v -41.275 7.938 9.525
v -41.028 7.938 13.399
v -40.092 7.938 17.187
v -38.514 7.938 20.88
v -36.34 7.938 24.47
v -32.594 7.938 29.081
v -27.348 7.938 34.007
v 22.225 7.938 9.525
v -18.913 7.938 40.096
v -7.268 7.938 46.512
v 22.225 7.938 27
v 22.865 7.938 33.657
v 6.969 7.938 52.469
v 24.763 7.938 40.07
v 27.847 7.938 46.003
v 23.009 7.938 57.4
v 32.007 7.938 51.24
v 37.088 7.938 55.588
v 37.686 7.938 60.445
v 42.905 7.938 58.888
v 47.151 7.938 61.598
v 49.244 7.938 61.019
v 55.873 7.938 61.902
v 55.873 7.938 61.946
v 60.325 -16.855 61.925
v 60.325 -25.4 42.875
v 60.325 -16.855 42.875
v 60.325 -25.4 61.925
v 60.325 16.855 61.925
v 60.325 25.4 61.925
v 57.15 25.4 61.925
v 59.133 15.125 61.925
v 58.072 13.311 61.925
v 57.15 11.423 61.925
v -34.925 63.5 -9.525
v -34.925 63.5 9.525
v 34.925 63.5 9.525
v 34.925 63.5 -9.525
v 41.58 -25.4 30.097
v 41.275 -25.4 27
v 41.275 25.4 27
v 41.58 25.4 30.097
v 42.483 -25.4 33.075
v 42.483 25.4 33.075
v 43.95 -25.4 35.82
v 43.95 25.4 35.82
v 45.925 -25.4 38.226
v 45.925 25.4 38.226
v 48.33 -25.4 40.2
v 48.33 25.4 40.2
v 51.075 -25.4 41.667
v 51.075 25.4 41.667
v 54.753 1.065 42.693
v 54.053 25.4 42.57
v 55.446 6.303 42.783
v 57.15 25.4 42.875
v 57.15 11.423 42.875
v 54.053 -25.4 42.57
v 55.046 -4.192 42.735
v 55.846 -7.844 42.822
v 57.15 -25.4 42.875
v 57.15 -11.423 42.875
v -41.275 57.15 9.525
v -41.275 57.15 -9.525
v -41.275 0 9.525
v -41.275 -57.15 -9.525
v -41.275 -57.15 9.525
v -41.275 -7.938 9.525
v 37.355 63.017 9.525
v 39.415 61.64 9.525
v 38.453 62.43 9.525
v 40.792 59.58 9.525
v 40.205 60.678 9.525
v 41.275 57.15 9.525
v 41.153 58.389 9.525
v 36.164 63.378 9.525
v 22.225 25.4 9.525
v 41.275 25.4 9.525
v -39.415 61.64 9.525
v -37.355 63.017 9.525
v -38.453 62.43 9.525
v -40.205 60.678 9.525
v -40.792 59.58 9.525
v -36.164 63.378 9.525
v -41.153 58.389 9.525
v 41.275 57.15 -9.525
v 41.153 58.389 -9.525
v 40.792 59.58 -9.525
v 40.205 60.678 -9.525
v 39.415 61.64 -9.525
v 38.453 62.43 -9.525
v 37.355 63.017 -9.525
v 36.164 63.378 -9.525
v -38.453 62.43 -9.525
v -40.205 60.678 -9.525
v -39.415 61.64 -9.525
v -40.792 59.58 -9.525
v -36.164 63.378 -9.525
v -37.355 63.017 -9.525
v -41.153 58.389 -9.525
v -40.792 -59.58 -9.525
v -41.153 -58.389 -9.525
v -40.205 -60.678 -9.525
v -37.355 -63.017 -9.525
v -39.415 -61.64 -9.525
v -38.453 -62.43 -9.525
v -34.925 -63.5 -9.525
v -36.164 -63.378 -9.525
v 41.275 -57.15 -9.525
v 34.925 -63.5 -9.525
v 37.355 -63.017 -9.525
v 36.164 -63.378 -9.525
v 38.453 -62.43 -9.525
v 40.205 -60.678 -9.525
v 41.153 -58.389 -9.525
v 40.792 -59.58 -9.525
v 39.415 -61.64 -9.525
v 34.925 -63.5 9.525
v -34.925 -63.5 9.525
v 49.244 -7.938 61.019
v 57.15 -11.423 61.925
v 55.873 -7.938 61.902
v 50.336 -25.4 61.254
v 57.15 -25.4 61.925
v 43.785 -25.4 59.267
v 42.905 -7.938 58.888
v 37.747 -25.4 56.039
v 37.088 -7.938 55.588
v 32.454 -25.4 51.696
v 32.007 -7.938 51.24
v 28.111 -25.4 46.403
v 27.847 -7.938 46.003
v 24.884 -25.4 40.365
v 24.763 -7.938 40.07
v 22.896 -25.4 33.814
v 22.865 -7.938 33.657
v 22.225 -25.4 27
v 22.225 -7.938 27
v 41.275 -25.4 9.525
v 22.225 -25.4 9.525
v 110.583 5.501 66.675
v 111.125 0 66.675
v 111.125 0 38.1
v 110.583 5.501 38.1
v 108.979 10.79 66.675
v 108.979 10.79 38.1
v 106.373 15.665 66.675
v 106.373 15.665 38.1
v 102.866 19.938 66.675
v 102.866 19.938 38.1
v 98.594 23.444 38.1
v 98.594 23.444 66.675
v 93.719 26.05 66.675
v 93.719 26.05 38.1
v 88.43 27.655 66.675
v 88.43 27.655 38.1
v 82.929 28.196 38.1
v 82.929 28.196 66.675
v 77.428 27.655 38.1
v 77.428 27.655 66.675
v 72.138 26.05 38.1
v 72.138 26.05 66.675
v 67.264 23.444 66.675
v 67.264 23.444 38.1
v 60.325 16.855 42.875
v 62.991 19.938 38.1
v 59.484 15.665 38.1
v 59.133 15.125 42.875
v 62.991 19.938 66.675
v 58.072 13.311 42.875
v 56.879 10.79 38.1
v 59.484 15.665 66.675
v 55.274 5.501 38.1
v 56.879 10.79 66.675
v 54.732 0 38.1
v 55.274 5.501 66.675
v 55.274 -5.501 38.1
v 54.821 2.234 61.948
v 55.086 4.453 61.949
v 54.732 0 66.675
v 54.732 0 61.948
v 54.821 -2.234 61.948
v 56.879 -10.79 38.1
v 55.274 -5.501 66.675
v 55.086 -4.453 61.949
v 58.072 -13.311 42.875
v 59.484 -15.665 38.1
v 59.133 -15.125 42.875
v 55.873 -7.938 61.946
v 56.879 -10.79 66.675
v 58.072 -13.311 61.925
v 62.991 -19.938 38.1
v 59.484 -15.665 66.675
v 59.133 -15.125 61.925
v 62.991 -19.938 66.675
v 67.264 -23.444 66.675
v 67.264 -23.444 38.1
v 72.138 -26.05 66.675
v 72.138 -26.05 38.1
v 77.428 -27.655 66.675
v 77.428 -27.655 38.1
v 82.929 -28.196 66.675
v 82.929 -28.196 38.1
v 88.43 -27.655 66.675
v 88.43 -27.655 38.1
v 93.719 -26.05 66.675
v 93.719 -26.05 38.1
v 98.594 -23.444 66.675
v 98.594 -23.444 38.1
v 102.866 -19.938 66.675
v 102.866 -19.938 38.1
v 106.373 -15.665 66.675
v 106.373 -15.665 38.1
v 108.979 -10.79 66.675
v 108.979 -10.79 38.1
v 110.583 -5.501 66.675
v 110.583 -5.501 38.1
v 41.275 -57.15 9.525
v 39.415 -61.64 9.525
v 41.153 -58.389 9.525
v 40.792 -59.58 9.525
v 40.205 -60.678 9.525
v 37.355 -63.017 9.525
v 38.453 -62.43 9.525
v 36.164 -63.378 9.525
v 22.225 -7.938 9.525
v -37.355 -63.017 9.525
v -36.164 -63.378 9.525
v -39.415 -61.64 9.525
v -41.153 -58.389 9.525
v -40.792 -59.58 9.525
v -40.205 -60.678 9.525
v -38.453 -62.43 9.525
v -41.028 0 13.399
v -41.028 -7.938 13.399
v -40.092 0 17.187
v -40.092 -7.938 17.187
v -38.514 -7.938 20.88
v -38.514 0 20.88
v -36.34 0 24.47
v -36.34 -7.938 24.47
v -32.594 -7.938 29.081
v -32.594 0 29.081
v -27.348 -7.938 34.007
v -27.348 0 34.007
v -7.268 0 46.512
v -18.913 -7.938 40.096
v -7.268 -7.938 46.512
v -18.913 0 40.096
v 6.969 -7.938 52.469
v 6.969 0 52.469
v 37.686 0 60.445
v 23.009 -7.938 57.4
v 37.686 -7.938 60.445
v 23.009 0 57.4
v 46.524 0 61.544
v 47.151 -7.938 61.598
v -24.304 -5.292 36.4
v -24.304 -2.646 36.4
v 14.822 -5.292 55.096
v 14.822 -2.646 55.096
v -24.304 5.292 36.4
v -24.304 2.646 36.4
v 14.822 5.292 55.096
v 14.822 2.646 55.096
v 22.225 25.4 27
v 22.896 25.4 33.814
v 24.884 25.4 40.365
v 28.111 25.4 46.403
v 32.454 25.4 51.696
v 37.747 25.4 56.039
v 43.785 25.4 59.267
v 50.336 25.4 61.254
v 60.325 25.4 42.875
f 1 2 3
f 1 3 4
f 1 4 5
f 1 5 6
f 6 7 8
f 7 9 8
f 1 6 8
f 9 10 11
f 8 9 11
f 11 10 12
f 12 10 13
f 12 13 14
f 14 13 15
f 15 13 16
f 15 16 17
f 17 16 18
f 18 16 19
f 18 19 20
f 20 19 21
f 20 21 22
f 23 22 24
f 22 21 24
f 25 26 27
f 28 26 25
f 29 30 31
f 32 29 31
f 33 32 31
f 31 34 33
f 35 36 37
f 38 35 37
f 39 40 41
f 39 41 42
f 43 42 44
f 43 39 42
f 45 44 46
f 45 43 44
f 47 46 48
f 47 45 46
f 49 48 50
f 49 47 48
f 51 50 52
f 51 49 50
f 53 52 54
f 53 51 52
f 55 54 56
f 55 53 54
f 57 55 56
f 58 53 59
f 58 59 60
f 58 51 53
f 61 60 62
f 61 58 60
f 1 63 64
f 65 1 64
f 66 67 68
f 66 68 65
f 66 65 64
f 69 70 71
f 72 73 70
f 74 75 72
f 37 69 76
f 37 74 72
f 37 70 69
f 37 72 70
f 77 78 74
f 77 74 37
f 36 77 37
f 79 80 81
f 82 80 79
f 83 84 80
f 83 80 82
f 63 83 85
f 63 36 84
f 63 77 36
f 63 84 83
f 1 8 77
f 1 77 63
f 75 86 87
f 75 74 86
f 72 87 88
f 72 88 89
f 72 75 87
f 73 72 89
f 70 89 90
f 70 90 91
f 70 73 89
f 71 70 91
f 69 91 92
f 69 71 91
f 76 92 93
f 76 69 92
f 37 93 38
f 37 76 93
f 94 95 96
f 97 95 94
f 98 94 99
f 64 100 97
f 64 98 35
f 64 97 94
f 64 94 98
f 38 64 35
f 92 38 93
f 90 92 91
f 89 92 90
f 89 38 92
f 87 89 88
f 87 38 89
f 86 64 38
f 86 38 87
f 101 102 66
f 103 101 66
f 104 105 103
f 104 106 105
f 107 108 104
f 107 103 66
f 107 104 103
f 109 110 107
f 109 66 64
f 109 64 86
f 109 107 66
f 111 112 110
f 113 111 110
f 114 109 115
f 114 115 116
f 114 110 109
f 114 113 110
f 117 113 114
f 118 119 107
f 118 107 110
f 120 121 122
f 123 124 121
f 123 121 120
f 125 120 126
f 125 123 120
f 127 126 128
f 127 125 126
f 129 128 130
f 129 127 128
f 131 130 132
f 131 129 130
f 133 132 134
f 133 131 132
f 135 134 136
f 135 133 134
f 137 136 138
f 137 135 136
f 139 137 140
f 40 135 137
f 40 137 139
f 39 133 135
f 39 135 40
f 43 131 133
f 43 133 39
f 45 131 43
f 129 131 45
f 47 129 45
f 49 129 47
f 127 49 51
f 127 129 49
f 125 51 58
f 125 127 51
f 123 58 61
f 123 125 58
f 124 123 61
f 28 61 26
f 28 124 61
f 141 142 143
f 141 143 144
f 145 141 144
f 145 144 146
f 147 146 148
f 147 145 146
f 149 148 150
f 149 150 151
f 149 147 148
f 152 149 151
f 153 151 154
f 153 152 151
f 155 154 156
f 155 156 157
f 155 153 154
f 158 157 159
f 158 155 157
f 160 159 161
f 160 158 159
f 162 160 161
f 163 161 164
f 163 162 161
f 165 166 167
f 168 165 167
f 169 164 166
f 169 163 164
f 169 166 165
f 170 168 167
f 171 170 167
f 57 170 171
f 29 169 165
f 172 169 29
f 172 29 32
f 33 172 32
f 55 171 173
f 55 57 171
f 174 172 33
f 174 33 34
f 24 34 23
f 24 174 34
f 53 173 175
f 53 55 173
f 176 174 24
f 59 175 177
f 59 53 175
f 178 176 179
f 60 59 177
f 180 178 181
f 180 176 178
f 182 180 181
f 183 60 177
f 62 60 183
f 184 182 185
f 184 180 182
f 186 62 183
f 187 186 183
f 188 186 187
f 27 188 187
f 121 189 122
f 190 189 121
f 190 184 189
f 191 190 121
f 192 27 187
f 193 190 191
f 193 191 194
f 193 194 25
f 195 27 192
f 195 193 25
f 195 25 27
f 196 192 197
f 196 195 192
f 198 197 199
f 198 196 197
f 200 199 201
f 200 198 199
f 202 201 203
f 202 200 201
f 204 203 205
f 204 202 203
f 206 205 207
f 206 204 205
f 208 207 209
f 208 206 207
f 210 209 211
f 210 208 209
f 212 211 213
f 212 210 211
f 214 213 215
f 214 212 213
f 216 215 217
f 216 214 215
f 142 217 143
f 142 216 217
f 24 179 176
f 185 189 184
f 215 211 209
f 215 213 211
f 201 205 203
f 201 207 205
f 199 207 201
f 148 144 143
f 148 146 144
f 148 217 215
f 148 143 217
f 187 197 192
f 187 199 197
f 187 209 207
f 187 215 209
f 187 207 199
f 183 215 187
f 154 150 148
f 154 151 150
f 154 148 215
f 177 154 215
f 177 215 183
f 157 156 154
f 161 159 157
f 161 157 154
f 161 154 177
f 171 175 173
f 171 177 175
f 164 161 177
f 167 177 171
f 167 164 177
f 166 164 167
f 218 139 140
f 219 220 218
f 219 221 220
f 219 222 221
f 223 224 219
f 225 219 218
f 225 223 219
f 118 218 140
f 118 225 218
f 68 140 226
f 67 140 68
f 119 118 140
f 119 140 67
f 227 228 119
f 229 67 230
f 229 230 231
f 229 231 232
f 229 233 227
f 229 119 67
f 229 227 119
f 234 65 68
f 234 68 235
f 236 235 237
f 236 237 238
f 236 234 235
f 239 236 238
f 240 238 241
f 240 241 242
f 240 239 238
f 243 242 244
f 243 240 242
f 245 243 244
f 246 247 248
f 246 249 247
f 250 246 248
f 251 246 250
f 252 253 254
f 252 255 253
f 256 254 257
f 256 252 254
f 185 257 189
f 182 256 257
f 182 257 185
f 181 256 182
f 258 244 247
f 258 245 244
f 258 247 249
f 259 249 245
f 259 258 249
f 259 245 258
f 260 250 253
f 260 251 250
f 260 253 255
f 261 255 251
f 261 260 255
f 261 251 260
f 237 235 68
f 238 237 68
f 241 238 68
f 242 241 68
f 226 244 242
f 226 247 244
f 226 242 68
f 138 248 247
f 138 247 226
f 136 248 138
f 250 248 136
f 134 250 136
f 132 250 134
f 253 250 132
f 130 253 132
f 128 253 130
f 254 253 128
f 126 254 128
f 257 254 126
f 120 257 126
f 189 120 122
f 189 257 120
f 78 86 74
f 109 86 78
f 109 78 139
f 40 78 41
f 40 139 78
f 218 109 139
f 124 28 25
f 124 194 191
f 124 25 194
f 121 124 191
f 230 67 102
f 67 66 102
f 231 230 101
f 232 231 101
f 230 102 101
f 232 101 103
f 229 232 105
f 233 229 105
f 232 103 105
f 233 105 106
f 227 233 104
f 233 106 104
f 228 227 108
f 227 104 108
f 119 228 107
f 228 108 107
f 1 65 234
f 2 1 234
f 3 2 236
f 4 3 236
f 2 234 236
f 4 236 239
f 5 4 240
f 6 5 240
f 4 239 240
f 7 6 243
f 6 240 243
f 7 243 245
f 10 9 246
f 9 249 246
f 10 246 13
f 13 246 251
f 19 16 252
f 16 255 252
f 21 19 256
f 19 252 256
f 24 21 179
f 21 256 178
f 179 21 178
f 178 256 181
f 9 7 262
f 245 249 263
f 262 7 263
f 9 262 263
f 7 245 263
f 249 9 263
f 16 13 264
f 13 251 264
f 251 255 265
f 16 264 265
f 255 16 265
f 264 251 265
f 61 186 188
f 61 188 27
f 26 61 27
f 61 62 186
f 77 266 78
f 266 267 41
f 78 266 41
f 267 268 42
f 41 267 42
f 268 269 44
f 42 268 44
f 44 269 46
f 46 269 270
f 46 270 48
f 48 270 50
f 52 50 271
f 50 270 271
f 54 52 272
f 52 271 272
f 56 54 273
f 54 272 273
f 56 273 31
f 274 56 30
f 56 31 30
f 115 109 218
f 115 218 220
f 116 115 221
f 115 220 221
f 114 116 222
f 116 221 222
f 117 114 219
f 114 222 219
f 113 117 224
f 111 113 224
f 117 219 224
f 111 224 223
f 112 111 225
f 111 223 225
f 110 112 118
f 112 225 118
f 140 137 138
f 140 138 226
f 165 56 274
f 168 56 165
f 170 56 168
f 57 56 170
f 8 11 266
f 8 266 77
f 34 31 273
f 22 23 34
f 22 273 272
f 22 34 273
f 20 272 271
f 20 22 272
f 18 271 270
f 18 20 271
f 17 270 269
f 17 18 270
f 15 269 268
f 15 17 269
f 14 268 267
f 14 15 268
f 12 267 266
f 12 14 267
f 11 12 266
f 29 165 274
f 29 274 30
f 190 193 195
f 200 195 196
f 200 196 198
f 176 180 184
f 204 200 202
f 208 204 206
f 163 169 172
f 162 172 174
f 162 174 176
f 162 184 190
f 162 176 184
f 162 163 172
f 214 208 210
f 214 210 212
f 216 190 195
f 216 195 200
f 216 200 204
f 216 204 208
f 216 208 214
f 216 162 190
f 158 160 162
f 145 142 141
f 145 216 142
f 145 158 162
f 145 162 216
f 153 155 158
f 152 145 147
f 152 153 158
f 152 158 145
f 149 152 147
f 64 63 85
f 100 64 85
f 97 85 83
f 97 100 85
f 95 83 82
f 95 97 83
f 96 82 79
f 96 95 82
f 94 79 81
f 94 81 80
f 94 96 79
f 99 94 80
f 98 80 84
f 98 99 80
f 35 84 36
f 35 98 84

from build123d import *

# Parameters (mm, degrees)
F1_DEPTH = 63.5
F2_DEPTH = 25.4
F3_DEPTH = 7.9375
F5_R     = 6.35


with BuildPart() as f1:
    # F0 (on Front) → F1 (new body, symmetric)
    with BuildSketch(Plane.XZ):
        Polygon((41.275, -9.525), (41.275, 9.525), (22.225, 9.525), (-41.275, 9.525), (-41.275, -9.525), align=None)
    extrude(amount=F1_DEPTH, both=True)

    # F0 (on Front) → F2 (join, symmetric)
    with BuildSketch(Plane.XZ):
        with BuildLine():
            Line((22.225, 9.525), (41.275, 9.525))
            Line((41.275, 9.525), (41.275, 27.0002))
            ThreePointArc((41.275, 27.0002), (45.92468, 38.22552), (57.15, 42.8752))
            Line((57.15, 42.8752), (60.325, 42.8752))
            Line((60.325, 42.8752), (60.325, 61.9252))
            Line((60.325, 61.9252), (57.15, 61.9252))
            ThreePointArc((57.15, 61.9252), (32.454296, 51.695904), (22.225, 27.0002))
            Line((22.225, 27.0002), (22.225, 9.525))
        make_face()
    extrude(amount=F2_DEPTH, both=True)

    # F0 (on Front) → F3 (join, symmetric)
    with BuildSketch(Plane.XZ):
        with BuildLine():
            Line((-41.275, 9.525), (22.225, 9.525))
            Line((22.225, 9.525), (22.225, 27.0002))
            ThreePointArc((22.225, 27.0002), (32.454296, 51.695904), (57.15, 61.9252))
            add(Edge.make_bspline(
                [(-41.275, 9.525), (-42.136356, 39.629813), (22.141983, 62.799598), (57.15, 61.9252)],
                knots=[0, 0, 0, 0, 111.504536, 111.504536, 111.504536, 111.504536], degree=3))
        make_face()
    extrude(amount=F3_DEPTH, both=True)

    # F0 (on Front) → F4 (revolve)
    with BuildSketch(Plane.XZ):
        Polygon((82.928714, 61.9252), (82.928714, 42.8752), (82.928714, 38.1), (111.125, 38.1), (111.125, 66.675), (82.928714, 66.675), align=None)
    revolve(axis=Axis((82.928714, 0, 52.3875), (0, 0, 1)))

    # F5
    f5_edges = [f1.edges().sort_by_distance(p)[0] for p in [
        (41.275, -63.5, 0),
        (-41.275, -63.5, 0),
        (41.275, 63.5, 0),
        (-41.275, 63.5, 0),
    ]]
    fillet(f5_edges, radius=F5_R)


solid = f1.part
